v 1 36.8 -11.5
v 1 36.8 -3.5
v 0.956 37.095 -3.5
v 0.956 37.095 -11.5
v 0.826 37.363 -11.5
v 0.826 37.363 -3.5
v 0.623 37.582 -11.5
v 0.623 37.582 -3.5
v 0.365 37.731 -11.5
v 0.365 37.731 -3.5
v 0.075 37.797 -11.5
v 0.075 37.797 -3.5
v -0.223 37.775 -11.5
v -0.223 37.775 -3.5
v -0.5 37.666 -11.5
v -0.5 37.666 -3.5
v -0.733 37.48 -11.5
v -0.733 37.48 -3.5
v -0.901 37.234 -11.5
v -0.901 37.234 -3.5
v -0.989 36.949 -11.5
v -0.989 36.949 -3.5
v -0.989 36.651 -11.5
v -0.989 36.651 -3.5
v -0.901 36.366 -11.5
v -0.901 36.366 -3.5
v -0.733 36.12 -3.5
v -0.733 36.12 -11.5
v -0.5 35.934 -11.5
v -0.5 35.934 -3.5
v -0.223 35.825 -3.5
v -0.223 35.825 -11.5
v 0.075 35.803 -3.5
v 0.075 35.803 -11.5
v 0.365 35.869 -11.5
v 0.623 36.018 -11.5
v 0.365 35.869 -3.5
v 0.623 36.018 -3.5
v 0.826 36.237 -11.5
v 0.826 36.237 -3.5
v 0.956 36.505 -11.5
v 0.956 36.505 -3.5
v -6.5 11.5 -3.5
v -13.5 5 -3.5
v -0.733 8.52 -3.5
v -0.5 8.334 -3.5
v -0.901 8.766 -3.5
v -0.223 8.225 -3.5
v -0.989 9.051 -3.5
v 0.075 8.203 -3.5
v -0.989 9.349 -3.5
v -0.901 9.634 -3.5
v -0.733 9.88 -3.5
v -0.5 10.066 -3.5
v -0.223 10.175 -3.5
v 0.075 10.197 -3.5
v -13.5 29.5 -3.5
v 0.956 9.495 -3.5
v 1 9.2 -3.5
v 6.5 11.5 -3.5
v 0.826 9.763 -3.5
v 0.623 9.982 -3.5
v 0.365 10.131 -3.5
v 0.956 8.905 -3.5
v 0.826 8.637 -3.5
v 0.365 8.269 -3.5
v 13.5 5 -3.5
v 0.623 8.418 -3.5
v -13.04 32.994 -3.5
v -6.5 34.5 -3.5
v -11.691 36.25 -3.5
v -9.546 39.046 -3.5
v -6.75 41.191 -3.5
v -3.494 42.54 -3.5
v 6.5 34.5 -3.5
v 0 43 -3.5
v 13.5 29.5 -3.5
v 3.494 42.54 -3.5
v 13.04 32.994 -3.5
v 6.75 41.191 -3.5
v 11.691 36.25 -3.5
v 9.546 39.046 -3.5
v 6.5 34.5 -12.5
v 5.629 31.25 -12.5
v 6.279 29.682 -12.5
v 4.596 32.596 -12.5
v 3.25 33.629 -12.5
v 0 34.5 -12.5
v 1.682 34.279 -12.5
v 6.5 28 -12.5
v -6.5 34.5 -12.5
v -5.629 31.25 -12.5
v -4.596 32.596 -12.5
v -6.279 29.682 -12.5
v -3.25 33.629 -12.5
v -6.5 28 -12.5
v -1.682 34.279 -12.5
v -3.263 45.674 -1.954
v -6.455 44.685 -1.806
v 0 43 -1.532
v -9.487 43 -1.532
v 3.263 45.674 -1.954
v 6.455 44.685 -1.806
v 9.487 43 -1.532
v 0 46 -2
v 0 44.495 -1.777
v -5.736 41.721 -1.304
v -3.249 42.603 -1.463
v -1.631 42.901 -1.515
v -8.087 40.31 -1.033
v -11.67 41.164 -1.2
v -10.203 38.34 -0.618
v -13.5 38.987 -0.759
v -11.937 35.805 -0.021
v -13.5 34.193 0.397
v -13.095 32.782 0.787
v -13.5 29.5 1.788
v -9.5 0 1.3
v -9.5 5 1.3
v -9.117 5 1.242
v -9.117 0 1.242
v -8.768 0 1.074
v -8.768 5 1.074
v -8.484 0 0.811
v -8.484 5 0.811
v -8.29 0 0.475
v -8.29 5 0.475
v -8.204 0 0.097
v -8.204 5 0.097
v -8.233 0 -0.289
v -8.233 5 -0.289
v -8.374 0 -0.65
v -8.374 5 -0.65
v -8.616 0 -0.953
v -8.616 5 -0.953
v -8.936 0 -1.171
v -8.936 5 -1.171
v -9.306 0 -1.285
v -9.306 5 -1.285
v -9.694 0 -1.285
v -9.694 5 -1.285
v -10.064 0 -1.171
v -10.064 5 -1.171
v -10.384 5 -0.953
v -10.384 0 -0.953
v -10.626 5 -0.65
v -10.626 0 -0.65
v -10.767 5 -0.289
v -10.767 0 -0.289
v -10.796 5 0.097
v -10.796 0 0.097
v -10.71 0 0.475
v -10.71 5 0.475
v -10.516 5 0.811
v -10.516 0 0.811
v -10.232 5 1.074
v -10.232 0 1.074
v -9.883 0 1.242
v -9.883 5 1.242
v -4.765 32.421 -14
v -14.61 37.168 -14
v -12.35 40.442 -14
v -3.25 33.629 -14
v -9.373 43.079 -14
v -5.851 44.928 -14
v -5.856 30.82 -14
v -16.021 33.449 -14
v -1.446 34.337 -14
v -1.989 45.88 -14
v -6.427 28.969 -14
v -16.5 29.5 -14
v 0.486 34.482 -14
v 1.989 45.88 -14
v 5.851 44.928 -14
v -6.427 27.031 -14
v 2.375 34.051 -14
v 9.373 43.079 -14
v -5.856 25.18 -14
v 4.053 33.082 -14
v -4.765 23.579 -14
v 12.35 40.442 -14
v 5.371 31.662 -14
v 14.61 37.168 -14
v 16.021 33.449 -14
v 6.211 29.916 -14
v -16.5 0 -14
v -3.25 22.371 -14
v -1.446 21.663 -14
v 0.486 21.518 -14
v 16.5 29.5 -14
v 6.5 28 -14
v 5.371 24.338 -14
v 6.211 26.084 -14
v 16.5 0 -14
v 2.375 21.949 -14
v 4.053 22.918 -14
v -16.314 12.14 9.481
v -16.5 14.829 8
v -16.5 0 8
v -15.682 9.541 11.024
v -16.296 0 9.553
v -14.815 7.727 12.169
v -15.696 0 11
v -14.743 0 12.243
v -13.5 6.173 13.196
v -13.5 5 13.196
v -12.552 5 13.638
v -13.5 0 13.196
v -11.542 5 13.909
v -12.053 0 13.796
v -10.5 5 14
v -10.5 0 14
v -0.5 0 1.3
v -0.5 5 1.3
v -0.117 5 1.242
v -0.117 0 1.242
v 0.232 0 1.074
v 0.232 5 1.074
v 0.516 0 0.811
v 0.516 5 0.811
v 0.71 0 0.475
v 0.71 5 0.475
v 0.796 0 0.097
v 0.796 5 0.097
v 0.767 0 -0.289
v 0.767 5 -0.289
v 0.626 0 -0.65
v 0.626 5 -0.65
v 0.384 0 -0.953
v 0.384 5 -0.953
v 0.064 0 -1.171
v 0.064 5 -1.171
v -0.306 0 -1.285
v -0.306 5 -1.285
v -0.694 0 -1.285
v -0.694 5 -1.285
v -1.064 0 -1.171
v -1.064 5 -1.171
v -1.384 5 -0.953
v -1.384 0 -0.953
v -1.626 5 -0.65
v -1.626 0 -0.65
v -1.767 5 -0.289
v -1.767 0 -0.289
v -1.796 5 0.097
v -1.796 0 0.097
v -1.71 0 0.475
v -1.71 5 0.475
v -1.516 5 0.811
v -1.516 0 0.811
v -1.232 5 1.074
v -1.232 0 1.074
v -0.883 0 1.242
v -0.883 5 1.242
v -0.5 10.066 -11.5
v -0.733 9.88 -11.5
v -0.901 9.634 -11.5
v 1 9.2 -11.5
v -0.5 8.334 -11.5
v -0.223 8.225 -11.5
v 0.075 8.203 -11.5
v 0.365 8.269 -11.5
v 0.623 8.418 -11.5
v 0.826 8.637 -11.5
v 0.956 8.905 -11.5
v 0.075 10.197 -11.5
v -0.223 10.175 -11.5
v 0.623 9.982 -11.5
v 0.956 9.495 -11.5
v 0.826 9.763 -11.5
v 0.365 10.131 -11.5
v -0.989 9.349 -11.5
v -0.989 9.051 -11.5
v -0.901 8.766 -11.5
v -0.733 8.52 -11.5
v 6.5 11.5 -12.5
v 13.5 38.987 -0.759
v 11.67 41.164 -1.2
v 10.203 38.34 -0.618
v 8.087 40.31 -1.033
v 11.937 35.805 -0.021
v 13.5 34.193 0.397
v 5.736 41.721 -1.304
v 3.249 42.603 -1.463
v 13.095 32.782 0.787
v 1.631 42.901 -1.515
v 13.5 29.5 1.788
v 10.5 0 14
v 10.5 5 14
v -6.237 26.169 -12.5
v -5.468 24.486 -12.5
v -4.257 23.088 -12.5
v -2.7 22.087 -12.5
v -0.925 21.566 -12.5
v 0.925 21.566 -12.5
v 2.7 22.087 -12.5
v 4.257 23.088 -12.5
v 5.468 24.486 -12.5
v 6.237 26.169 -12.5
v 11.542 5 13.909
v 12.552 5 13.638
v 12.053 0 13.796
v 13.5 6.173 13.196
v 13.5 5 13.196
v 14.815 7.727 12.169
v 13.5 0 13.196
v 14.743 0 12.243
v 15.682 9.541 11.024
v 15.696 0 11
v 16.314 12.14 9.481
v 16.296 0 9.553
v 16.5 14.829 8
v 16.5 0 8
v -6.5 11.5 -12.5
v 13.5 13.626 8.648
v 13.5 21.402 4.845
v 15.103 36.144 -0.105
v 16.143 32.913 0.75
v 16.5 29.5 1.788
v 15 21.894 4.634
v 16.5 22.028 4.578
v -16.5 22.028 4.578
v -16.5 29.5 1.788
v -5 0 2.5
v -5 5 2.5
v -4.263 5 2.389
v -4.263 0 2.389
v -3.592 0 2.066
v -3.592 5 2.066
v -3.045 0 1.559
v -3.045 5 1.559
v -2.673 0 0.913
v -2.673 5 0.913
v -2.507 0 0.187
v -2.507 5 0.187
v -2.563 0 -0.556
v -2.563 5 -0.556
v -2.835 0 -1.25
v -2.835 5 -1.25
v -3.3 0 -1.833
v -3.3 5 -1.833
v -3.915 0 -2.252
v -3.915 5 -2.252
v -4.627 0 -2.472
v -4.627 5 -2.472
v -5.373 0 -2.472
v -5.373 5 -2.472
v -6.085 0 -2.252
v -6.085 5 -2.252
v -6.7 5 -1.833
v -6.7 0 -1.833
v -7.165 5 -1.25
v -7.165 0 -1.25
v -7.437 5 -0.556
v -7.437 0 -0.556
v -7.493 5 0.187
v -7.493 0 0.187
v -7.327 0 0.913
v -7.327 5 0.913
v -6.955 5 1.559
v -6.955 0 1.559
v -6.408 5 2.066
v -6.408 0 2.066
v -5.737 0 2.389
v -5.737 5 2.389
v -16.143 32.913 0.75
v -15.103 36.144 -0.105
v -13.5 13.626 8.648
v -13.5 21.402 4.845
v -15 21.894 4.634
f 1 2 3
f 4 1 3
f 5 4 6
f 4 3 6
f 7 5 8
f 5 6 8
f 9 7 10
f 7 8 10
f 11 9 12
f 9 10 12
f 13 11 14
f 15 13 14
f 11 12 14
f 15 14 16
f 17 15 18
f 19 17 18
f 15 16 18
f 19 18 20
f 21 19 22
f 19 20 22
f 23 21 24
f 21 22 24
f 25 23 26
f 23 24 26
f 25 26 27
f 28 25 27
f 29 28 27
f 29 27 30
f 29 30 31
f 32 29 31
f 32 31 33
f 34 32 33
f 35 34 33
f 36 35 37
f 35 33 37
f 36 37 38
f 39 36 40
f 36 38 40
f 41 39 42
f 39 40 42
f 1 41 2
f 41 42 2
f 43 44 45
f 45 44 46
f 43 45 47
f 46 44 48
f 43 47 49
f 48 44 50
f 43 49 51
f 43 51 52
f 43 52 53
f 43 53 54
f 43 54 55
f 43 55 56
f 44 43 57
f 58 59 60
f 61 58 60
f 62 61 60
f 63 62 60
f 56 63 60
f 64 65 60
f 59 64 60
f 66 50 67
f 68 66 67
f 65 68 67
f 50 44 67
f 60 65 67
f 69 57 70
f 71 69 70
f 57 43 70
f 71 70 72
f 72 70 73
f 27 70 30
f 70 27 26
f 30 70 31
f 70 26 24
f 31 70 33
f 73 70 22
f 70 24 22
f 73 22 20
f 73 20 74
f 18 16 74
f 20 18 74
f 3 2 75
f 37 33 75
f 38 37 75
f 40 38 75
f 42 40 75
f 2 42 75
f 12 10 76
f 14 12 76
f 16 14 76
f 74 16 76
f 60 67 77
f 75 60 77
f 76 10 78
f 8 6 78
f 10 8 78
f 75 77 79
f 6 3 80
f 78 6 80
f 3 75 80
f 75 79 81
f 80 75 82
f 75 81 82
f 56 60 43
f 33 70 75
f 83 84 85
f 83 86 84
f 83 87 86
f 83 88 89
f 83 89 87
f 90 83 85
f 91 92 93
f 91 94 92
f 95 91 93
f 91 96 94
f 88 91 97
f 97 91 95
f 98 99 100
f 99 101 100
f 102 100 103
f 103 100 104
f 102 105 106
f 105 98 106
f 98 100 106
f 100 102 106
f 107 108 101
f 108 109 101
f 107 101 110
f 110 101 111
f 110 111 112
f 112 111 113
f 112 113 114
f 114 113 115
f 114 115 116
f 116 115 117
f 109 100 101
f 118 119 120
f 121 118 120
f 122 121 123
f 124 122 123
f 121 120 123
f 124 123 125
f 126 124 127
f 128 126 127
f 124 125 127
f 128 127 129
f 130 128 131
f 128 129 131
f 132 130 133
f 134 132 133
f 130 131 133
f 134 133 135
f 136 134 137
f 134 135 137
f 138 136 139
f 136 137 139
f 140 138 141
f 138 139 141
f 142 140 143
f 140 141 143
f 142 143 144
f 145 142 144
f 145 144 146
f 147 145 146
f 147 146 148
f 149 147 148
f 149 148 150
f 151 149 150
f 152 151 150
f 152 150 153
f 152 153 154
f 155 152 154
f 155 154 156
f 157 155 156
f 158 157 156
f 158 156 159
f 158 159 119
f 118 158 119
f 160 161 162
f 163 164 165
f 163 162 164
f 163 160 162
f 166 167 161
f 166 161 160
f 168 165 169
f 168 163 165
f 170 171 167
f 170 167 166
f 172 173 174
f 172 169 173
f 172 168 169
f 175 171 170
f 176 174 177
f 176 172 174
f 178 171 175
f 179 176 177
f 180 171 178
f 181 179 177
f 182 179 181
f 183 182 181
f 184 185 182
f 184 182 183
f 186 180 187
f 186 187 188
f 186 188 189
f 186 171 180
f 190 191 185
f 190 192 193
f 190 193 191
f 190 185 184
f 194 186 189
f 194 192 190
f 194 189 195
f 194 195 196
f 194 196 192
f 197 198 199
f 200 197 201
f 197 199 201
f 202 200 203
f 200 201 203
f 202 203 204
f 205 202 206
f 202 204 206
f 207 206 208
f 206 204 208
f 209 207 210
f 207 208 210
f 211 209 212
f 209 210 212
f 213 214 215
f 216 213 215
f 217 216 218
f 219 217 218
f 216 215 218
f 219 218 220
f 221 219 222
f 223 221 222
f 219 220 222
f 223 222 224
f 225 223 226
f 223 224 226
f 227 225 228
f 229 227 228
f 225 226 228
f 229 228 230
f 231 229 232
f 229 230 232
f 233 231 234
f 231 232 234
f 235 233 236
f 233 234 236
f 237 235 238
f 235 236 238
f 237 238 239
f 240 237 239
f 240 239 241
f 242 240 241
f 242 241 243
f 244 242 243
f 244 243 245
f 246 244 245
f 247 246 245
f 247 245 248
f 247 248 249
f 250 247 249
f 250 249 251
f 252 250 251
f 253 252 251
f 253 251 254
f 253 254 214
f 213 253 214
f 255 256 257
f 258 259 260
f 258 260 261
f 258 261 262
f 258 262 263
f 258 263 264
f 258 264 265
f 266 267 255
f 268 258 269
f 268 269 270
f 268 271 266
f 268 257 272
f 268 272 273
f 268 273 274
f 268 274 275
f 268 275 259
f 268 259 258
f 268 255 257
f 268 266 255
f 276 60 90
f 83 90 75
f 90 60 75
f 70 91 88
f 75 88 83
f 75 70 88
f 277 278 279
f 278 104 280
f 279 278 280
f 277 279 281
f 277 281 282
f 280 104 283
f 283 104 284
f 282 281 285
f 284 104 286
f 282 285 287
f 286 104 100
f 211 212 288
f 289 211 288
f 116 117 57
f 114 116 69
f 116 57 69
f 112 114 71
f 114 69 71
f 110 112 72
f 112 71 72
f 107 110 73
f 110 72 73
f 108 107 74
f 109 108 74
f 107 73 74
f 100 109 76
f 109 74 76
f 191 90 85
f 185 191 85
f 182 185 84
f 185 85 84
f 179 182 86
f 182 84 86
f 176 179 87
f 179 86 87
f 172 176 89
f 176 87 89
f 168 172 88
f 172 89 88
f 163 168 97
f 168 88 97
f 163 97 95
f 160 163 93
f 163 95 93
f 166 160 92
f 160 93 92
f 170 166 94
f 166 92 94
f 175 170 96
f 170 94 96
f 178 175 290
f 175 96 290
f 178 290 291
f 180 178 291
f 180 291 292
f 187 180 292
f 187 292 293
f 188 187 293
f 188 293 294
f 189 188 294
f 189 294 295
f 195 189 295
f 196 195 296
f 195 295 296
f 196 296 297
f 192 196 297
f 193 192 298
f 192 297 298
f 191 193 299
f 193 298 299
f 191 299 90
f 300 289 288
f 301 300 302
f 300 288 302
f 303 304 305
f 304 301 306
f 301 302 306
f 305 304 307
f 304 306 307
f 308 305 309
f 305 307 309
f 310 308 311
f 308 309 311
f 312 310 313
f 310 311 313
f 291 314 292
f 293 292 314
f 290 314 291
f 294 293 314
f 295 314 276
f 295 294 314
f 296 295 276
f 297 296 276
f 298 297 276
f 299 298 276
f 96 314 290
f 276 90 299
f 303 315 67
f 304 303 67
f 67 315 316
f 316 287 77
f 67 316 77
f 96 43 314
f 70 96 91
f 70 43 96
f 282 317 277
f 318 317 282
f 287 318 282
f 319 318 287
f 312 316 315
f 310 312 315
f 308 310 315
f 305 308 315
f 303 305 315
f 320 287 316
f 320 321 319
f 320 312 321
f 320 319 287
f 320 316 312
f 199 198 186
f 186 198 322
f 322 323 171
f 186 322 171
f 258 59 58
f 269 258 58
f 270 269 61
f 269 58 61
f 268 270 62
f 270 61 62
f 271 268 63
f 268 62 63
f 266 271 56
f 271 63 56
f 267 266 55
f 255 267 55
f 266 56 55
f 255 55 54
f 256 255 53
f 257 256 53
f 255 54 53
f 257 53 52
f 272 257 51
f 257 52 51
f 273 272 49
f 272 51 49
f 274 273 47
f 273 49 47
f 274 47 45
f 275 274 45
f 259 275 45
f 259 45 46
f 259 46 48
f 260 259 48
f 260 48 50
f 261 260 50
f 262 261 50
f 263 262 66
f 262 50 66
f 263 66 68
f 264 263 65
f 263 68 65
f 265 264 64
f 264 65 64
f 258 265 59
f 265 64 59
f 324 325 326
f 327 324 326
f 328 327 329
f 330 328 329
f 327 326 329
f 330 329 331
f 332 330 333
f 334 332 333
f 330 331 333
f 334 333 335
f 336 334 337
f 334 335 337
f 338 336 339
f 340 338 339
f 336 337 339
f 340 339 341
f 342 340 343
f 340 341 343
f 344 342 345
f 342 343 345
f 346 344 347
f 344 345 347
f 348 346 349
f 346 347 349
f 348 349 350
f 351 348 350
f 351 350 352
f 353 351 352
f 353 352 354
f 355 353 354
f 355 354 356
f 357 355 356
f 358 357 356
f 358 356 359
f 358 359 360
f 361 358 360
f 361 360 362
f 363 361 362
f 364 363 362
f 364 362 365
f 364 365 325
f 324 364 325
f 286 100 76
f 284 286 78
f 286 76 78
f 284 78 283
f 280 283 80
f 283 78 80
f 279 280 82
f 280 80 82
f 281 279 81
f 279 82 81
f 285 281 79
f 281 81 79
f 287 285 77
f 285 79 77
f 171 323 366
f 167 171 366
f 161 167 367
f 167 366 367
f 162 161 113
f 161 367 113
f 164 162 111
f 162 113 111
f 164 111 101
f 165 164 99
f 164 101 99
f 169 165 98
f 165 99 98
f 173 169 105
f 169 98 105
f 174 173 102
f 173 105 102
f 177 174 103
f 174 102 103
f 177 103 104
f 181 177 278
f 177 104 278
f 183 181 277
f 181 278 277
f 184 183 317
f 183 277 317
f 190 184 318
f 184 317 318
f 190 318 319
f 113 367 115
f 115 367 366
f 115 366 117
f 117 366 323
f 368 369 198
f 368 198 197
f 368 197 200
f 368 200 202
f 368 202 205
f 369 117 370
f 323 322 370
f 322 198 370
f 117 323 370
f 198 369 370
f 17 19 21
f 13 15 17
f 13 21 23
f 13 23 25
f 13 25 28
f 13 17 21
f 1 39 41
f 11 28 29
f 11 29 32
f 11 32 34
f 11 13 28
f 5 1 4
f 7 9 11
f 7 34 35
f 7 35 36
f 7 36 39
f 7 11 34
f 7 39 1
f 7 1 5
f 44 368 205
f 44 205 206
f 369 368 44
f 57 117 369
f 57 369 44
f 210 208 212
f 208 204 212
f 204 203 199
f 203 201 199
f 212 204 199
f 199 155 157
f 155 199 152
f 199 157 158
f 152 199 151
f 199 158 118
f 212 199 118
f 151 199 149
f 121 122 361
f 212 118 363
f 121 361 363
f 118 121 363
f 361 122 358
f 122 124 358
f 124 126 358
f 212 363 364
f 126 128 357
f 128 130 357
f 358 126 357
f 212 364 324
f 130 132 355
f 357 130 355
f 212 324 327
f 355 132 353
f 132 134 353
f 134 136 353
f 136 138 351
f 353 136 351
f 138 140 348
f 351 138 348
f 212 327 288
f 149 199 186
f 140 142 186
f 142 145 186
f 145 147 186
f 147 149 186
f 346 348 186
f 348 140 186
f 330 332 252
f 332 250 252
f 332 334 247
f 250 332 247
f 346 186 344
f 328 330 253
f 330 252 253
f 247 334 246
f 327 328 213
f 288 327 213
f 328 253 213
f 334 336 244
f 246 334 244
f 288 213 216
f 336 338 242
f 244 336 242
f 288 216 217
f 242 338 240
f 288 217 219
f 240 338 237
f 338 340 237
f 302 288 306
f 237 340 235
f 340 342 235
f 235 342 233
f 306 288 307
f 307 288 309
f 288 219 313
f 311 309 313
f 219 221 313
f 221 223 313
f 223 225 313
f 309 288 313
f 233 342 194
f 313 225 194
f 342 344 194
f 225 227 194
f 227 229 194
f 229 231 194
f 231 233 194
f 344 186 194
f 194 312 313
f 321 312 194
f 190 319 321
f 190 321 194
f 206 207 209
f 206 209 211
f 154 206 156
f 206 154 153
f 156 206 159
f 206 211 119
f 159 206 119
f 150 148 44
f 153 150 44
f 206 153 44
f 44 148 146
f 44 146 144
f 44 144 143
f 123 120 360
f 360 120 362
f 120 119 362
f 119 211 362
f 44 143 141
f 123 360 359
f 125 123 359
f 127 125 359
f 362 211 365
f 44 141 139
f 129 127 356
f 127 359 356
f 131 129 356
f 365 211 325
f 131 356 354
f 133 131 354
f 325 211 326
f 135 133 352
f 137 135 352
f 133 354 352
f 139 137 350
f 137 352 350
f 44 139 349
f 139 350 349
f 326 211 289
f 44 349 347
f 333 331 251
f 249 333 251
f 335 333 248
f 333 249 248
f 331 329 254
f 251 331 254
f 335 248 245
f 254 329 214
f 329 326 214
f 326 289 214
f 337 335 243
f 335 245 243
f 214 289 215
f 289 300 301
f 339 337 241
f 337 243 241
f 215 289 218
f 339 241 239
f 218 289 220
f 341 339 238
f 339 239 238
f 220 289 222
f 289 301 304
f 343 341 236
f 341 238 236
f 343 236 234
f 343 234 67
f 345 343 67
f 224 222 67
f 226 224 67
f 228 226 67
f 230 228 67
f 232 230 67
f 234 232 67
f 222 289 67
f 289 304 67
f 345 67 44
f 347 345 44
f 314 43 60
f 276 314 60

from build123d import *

# Parameters (mm, degrees)
SKETCH1_W           = 33
SKETCH1_H           = 28
BOSS_EXTRUDE1_DEPTH = 46
SKETCH2_W           = 17.5
SKETCH2_H           = 41
CUT_EXTRUDE1_DEPTH  = 59.318093247
EXTRUDE_S_DEPTH     = 3
BOSS_EXTRUDE3_DEPTH = 27
FILLET1_START       = -3.5
FILLET1_DEPTH       = 5.287760197
FILLET1_START_2     = -13.5
FILLET1_2_DEPTH     = 27
FILLET2_R           = 16.5
FILLET3_R           = 6
SKETCH5_W           = 13
SKETCH5_H           = 23
CUT_EXTRUDE3_DEPTH  = 9
SKETCH6_R           = 6.5
CUT_EXTRUDE4_DEPTH  = 9
SKETCH7_R           = 1
CUT_EXTRUDE5_DEPTH  = 8
SKETCH8_R           = 1.3
SKETCH8_R_2         = 2.5
CUT_EXTRUDE6_DEPTH  = 47.360004895


with BuildPart() as part:
    # Sketch1 → Boss-Extrude1 (new body)
    with BuildSketch(Plane(origin=(0, 0, 0), x_dir=(1, 0, 0), z_dir=(0, 1, 0))):
        Rectangle(SKETCH1_W, SKETCH1_H)
    extrude(amount=BOSS_EXTRUDE1_DEPTH)

    # Sketch2 → Cut-Extrude1 (cut, through all)
    with BuildSketch(Plane(origin=(16.5, 0, 0), x_dir=(0, 0, -1), z_dir=(1, 0, 0))):
        with Locations((-5.25, 25.5)):
            Rectangle(SKETCH2_W, SKETCH2_H)
    extrude(amount=-CUT_EXTRUDE1_DEPTH, mode=Mode.SUBTRACT)

    # Sketch3 → Extrude S (add)
    with BuildSketch(Plane(origin=(16.5, 0, 0), x_dir=(0, 0, -1), z_dir=(1, 0, 0))):
        with BuildLine():
            Line((-14, 5), (3.5, 5))
            Line((3.5, 5), (3.5, 46))
            Line((3.5, 46), (2, 46))
            add(Edge.make_bspline(
                [(2, 46), (-1.17854194, 23.414715012), (-14, 5)],
                knots=[0, 0, 0, 1, 1, 1], degree=2))
        make_face()
    extrude_s = extrude(amount=-EXTRUDE_S_DEPTH)

    # Mirror1: Extrude S across plane
    add(extrude_s.mirror(Plane(origin=(0, 0, 0), x_dir=(0, 0, 1), z_dir=(1, 0, 0))))

    # Sketch4 → Boss-Extrude3 (add)
    with BuildSketch(Plane.ZY.offset(-13.5)):
        with BuildLine():
            Line((-3.5, 46), (-3.5, 43))
            Line((-3.5, 43), (-1.532109396, 43))
            add(Edge.make_bspline(
                [(-1.532109396, 43), (-1.787586761, 44.490687359), (-1.999999999, 45.999999992)],
                knots=[0.933172744, 0.933172744, 0.933172744, 1, 1, 1], degree=2))
            Line((-1.999999999, 45.999999992), (-3.5, 46))
        make_face()
    extrude(amount=BOSS_EXTRUDE3_DEPTH)

    # Fillet1: read off the stored shape, not the designer's step
    # Fillet1 outline → Fillet1 (add)
    with BuildSketch(Plane.XY.offset(FILLET1_START)):
        with BuildLine():
            Line((-13.5, 43), (-13.5, 29.5))
            ThreePointArc((-13.5, 29.5), (-9.545941546, 39.045941546), (0, 43))
            Line((0, 43), (-13.5, 43))
        make_face()
        with BuildLine():
            Line((13.5, 43), (0, 43))
            ThreePointArc((0, 43), (9.545941546, 39.045941546), (13.5, 29.5))
            Line((13.5, 29.5), (13.5, 43))
        make_face()
    extrude(amount=FILLET1_DEPTH)

    # Fillet1 2 outline → Fillet1 2 (cut)
    with BuildSketch(Plane.YZ.offset(FILLET1_START_2)):
        with BuildLine():
            add(Edge.make_bspline(
                [(43, -1.532109396), (36.047422478, -0.340560963), (29.499999971, 1.787760107)],
                knots=[0.066827257, 0.066827257, 0.066827257, 0.378510105, 0.378510105, 0.378510105], degree=2))
            Line((43, -1.532109396), (43, 1.787760197))
            Line((43, 1.787760197), (29.499999971, 1.787760107))
        make_face()
    extrude(amount=FILLET1_2_DEPTH, mode=Mode.SUBTRACT)

    # Fillet2
    # the kernel refuses this fillet: 16.5 mm, written as the material it takes off along each edge
    with BuildSketch(Plane(origin=(16.5, 46, -55.25), x_dir=(0, -1, 0), z_dir=(0, 0, 1)), Plane(origin=(-16.5, 46, 39.25), x_dir=(0, -1, 0), z_dir=(0, 0, -1))) as fillet2_piece_1:
        with BuildLine():
            CenterArc((FILLET2_R, -FILLET2_R), FILLET2_R, 90, 90)
            Line((0, -FILLET2_R), (0, 0))
            Line((0, 0), (FILLET2_R, 0))
        make_face()
    extrude(amount=94.5, mode=Mode.SUBTRACT)

    # Fillet3
    # the kernel refuses this fillet: 6 mm, written as the material it takes off along each edge
    with BuildSketch(Plane(origin=(16.5, -15, 14), x_dir=(0, 0, -1), z_dir=(0, 1, 0)), Plane(origin=(-16.5, -15, 14), x_dir=(1, 0, 0), z_dir=(0, 1, 0))) as fillet3_piece_1:
        with BuildLine():
            CenterArc((FILLET3_R, FILLET3_R), FILLET3_R, 180, 90)
            Line((0, FILLET3_R), (0, 0))
            Line((0, 0), (FILLET3_R, 0))
        make_face()
    extrude(amount=35, mode=Mode.SUBTRACT)

    # Sketch5 → Cut-Extrude3 (cut)
    with BuildSketch(Plane.XY.offset(-3.5)):
        with Locations((0, 23)):
            Rectangle(SKETCH5_W, SKETCH5_H)
    extrude(amount=-CUT_EXTRUDE3_DEPTH, mode=Mode.SUBTRACT)

    # Sketch6 → Cut-Extrude4 (cut)
    with BuildSketch(Plane.XY.offset(-12.5)):
        with Locations((0, 28)):
            Circle(SKETCH6_R)
    extrude(amount=-CUT_EXTRUDE4_DEPTH, mode=Mode.SUBTRACT)

    # Sketch7 → Cut-Extrude5 (cut)
    with BuildSketch(Plane.XY.offset(-3.5)):
        with Locations((0, 36.8)):
            Circle(SKETCH7_R)
        with Locations((0, 9.2)):
            Circle(SKETCH7_R)
    extrude(amount=-CUT_EXTRUDE5_DEPTH, mode=Mode.SUBTRACT)

    # Sketch8 → Cut-Extrude6 (cut, through all)
    with BuildSketch(Plane(origin=(0, 5, 0), x_dir=(1, 0, 0), z_dir=(0, 1, 0))):
        with Locations(Location((-0.5, 0, 0), (0, 0, 270))):
            Circle(SKETCH8_R)
        with Locations(Location((-5, 0, 0), (0, 0, 270))):
            Circle(SKETCH8_R_2)
        with Locations(Location((-9.5, 0, 0), (0, 0, 270))):
            Circle(SKETCH8_R)
    extrude(amount=-CUT_EXTRUDE6_DEPTH, mode=Mode.SUBTRACT)


solid = part.part
